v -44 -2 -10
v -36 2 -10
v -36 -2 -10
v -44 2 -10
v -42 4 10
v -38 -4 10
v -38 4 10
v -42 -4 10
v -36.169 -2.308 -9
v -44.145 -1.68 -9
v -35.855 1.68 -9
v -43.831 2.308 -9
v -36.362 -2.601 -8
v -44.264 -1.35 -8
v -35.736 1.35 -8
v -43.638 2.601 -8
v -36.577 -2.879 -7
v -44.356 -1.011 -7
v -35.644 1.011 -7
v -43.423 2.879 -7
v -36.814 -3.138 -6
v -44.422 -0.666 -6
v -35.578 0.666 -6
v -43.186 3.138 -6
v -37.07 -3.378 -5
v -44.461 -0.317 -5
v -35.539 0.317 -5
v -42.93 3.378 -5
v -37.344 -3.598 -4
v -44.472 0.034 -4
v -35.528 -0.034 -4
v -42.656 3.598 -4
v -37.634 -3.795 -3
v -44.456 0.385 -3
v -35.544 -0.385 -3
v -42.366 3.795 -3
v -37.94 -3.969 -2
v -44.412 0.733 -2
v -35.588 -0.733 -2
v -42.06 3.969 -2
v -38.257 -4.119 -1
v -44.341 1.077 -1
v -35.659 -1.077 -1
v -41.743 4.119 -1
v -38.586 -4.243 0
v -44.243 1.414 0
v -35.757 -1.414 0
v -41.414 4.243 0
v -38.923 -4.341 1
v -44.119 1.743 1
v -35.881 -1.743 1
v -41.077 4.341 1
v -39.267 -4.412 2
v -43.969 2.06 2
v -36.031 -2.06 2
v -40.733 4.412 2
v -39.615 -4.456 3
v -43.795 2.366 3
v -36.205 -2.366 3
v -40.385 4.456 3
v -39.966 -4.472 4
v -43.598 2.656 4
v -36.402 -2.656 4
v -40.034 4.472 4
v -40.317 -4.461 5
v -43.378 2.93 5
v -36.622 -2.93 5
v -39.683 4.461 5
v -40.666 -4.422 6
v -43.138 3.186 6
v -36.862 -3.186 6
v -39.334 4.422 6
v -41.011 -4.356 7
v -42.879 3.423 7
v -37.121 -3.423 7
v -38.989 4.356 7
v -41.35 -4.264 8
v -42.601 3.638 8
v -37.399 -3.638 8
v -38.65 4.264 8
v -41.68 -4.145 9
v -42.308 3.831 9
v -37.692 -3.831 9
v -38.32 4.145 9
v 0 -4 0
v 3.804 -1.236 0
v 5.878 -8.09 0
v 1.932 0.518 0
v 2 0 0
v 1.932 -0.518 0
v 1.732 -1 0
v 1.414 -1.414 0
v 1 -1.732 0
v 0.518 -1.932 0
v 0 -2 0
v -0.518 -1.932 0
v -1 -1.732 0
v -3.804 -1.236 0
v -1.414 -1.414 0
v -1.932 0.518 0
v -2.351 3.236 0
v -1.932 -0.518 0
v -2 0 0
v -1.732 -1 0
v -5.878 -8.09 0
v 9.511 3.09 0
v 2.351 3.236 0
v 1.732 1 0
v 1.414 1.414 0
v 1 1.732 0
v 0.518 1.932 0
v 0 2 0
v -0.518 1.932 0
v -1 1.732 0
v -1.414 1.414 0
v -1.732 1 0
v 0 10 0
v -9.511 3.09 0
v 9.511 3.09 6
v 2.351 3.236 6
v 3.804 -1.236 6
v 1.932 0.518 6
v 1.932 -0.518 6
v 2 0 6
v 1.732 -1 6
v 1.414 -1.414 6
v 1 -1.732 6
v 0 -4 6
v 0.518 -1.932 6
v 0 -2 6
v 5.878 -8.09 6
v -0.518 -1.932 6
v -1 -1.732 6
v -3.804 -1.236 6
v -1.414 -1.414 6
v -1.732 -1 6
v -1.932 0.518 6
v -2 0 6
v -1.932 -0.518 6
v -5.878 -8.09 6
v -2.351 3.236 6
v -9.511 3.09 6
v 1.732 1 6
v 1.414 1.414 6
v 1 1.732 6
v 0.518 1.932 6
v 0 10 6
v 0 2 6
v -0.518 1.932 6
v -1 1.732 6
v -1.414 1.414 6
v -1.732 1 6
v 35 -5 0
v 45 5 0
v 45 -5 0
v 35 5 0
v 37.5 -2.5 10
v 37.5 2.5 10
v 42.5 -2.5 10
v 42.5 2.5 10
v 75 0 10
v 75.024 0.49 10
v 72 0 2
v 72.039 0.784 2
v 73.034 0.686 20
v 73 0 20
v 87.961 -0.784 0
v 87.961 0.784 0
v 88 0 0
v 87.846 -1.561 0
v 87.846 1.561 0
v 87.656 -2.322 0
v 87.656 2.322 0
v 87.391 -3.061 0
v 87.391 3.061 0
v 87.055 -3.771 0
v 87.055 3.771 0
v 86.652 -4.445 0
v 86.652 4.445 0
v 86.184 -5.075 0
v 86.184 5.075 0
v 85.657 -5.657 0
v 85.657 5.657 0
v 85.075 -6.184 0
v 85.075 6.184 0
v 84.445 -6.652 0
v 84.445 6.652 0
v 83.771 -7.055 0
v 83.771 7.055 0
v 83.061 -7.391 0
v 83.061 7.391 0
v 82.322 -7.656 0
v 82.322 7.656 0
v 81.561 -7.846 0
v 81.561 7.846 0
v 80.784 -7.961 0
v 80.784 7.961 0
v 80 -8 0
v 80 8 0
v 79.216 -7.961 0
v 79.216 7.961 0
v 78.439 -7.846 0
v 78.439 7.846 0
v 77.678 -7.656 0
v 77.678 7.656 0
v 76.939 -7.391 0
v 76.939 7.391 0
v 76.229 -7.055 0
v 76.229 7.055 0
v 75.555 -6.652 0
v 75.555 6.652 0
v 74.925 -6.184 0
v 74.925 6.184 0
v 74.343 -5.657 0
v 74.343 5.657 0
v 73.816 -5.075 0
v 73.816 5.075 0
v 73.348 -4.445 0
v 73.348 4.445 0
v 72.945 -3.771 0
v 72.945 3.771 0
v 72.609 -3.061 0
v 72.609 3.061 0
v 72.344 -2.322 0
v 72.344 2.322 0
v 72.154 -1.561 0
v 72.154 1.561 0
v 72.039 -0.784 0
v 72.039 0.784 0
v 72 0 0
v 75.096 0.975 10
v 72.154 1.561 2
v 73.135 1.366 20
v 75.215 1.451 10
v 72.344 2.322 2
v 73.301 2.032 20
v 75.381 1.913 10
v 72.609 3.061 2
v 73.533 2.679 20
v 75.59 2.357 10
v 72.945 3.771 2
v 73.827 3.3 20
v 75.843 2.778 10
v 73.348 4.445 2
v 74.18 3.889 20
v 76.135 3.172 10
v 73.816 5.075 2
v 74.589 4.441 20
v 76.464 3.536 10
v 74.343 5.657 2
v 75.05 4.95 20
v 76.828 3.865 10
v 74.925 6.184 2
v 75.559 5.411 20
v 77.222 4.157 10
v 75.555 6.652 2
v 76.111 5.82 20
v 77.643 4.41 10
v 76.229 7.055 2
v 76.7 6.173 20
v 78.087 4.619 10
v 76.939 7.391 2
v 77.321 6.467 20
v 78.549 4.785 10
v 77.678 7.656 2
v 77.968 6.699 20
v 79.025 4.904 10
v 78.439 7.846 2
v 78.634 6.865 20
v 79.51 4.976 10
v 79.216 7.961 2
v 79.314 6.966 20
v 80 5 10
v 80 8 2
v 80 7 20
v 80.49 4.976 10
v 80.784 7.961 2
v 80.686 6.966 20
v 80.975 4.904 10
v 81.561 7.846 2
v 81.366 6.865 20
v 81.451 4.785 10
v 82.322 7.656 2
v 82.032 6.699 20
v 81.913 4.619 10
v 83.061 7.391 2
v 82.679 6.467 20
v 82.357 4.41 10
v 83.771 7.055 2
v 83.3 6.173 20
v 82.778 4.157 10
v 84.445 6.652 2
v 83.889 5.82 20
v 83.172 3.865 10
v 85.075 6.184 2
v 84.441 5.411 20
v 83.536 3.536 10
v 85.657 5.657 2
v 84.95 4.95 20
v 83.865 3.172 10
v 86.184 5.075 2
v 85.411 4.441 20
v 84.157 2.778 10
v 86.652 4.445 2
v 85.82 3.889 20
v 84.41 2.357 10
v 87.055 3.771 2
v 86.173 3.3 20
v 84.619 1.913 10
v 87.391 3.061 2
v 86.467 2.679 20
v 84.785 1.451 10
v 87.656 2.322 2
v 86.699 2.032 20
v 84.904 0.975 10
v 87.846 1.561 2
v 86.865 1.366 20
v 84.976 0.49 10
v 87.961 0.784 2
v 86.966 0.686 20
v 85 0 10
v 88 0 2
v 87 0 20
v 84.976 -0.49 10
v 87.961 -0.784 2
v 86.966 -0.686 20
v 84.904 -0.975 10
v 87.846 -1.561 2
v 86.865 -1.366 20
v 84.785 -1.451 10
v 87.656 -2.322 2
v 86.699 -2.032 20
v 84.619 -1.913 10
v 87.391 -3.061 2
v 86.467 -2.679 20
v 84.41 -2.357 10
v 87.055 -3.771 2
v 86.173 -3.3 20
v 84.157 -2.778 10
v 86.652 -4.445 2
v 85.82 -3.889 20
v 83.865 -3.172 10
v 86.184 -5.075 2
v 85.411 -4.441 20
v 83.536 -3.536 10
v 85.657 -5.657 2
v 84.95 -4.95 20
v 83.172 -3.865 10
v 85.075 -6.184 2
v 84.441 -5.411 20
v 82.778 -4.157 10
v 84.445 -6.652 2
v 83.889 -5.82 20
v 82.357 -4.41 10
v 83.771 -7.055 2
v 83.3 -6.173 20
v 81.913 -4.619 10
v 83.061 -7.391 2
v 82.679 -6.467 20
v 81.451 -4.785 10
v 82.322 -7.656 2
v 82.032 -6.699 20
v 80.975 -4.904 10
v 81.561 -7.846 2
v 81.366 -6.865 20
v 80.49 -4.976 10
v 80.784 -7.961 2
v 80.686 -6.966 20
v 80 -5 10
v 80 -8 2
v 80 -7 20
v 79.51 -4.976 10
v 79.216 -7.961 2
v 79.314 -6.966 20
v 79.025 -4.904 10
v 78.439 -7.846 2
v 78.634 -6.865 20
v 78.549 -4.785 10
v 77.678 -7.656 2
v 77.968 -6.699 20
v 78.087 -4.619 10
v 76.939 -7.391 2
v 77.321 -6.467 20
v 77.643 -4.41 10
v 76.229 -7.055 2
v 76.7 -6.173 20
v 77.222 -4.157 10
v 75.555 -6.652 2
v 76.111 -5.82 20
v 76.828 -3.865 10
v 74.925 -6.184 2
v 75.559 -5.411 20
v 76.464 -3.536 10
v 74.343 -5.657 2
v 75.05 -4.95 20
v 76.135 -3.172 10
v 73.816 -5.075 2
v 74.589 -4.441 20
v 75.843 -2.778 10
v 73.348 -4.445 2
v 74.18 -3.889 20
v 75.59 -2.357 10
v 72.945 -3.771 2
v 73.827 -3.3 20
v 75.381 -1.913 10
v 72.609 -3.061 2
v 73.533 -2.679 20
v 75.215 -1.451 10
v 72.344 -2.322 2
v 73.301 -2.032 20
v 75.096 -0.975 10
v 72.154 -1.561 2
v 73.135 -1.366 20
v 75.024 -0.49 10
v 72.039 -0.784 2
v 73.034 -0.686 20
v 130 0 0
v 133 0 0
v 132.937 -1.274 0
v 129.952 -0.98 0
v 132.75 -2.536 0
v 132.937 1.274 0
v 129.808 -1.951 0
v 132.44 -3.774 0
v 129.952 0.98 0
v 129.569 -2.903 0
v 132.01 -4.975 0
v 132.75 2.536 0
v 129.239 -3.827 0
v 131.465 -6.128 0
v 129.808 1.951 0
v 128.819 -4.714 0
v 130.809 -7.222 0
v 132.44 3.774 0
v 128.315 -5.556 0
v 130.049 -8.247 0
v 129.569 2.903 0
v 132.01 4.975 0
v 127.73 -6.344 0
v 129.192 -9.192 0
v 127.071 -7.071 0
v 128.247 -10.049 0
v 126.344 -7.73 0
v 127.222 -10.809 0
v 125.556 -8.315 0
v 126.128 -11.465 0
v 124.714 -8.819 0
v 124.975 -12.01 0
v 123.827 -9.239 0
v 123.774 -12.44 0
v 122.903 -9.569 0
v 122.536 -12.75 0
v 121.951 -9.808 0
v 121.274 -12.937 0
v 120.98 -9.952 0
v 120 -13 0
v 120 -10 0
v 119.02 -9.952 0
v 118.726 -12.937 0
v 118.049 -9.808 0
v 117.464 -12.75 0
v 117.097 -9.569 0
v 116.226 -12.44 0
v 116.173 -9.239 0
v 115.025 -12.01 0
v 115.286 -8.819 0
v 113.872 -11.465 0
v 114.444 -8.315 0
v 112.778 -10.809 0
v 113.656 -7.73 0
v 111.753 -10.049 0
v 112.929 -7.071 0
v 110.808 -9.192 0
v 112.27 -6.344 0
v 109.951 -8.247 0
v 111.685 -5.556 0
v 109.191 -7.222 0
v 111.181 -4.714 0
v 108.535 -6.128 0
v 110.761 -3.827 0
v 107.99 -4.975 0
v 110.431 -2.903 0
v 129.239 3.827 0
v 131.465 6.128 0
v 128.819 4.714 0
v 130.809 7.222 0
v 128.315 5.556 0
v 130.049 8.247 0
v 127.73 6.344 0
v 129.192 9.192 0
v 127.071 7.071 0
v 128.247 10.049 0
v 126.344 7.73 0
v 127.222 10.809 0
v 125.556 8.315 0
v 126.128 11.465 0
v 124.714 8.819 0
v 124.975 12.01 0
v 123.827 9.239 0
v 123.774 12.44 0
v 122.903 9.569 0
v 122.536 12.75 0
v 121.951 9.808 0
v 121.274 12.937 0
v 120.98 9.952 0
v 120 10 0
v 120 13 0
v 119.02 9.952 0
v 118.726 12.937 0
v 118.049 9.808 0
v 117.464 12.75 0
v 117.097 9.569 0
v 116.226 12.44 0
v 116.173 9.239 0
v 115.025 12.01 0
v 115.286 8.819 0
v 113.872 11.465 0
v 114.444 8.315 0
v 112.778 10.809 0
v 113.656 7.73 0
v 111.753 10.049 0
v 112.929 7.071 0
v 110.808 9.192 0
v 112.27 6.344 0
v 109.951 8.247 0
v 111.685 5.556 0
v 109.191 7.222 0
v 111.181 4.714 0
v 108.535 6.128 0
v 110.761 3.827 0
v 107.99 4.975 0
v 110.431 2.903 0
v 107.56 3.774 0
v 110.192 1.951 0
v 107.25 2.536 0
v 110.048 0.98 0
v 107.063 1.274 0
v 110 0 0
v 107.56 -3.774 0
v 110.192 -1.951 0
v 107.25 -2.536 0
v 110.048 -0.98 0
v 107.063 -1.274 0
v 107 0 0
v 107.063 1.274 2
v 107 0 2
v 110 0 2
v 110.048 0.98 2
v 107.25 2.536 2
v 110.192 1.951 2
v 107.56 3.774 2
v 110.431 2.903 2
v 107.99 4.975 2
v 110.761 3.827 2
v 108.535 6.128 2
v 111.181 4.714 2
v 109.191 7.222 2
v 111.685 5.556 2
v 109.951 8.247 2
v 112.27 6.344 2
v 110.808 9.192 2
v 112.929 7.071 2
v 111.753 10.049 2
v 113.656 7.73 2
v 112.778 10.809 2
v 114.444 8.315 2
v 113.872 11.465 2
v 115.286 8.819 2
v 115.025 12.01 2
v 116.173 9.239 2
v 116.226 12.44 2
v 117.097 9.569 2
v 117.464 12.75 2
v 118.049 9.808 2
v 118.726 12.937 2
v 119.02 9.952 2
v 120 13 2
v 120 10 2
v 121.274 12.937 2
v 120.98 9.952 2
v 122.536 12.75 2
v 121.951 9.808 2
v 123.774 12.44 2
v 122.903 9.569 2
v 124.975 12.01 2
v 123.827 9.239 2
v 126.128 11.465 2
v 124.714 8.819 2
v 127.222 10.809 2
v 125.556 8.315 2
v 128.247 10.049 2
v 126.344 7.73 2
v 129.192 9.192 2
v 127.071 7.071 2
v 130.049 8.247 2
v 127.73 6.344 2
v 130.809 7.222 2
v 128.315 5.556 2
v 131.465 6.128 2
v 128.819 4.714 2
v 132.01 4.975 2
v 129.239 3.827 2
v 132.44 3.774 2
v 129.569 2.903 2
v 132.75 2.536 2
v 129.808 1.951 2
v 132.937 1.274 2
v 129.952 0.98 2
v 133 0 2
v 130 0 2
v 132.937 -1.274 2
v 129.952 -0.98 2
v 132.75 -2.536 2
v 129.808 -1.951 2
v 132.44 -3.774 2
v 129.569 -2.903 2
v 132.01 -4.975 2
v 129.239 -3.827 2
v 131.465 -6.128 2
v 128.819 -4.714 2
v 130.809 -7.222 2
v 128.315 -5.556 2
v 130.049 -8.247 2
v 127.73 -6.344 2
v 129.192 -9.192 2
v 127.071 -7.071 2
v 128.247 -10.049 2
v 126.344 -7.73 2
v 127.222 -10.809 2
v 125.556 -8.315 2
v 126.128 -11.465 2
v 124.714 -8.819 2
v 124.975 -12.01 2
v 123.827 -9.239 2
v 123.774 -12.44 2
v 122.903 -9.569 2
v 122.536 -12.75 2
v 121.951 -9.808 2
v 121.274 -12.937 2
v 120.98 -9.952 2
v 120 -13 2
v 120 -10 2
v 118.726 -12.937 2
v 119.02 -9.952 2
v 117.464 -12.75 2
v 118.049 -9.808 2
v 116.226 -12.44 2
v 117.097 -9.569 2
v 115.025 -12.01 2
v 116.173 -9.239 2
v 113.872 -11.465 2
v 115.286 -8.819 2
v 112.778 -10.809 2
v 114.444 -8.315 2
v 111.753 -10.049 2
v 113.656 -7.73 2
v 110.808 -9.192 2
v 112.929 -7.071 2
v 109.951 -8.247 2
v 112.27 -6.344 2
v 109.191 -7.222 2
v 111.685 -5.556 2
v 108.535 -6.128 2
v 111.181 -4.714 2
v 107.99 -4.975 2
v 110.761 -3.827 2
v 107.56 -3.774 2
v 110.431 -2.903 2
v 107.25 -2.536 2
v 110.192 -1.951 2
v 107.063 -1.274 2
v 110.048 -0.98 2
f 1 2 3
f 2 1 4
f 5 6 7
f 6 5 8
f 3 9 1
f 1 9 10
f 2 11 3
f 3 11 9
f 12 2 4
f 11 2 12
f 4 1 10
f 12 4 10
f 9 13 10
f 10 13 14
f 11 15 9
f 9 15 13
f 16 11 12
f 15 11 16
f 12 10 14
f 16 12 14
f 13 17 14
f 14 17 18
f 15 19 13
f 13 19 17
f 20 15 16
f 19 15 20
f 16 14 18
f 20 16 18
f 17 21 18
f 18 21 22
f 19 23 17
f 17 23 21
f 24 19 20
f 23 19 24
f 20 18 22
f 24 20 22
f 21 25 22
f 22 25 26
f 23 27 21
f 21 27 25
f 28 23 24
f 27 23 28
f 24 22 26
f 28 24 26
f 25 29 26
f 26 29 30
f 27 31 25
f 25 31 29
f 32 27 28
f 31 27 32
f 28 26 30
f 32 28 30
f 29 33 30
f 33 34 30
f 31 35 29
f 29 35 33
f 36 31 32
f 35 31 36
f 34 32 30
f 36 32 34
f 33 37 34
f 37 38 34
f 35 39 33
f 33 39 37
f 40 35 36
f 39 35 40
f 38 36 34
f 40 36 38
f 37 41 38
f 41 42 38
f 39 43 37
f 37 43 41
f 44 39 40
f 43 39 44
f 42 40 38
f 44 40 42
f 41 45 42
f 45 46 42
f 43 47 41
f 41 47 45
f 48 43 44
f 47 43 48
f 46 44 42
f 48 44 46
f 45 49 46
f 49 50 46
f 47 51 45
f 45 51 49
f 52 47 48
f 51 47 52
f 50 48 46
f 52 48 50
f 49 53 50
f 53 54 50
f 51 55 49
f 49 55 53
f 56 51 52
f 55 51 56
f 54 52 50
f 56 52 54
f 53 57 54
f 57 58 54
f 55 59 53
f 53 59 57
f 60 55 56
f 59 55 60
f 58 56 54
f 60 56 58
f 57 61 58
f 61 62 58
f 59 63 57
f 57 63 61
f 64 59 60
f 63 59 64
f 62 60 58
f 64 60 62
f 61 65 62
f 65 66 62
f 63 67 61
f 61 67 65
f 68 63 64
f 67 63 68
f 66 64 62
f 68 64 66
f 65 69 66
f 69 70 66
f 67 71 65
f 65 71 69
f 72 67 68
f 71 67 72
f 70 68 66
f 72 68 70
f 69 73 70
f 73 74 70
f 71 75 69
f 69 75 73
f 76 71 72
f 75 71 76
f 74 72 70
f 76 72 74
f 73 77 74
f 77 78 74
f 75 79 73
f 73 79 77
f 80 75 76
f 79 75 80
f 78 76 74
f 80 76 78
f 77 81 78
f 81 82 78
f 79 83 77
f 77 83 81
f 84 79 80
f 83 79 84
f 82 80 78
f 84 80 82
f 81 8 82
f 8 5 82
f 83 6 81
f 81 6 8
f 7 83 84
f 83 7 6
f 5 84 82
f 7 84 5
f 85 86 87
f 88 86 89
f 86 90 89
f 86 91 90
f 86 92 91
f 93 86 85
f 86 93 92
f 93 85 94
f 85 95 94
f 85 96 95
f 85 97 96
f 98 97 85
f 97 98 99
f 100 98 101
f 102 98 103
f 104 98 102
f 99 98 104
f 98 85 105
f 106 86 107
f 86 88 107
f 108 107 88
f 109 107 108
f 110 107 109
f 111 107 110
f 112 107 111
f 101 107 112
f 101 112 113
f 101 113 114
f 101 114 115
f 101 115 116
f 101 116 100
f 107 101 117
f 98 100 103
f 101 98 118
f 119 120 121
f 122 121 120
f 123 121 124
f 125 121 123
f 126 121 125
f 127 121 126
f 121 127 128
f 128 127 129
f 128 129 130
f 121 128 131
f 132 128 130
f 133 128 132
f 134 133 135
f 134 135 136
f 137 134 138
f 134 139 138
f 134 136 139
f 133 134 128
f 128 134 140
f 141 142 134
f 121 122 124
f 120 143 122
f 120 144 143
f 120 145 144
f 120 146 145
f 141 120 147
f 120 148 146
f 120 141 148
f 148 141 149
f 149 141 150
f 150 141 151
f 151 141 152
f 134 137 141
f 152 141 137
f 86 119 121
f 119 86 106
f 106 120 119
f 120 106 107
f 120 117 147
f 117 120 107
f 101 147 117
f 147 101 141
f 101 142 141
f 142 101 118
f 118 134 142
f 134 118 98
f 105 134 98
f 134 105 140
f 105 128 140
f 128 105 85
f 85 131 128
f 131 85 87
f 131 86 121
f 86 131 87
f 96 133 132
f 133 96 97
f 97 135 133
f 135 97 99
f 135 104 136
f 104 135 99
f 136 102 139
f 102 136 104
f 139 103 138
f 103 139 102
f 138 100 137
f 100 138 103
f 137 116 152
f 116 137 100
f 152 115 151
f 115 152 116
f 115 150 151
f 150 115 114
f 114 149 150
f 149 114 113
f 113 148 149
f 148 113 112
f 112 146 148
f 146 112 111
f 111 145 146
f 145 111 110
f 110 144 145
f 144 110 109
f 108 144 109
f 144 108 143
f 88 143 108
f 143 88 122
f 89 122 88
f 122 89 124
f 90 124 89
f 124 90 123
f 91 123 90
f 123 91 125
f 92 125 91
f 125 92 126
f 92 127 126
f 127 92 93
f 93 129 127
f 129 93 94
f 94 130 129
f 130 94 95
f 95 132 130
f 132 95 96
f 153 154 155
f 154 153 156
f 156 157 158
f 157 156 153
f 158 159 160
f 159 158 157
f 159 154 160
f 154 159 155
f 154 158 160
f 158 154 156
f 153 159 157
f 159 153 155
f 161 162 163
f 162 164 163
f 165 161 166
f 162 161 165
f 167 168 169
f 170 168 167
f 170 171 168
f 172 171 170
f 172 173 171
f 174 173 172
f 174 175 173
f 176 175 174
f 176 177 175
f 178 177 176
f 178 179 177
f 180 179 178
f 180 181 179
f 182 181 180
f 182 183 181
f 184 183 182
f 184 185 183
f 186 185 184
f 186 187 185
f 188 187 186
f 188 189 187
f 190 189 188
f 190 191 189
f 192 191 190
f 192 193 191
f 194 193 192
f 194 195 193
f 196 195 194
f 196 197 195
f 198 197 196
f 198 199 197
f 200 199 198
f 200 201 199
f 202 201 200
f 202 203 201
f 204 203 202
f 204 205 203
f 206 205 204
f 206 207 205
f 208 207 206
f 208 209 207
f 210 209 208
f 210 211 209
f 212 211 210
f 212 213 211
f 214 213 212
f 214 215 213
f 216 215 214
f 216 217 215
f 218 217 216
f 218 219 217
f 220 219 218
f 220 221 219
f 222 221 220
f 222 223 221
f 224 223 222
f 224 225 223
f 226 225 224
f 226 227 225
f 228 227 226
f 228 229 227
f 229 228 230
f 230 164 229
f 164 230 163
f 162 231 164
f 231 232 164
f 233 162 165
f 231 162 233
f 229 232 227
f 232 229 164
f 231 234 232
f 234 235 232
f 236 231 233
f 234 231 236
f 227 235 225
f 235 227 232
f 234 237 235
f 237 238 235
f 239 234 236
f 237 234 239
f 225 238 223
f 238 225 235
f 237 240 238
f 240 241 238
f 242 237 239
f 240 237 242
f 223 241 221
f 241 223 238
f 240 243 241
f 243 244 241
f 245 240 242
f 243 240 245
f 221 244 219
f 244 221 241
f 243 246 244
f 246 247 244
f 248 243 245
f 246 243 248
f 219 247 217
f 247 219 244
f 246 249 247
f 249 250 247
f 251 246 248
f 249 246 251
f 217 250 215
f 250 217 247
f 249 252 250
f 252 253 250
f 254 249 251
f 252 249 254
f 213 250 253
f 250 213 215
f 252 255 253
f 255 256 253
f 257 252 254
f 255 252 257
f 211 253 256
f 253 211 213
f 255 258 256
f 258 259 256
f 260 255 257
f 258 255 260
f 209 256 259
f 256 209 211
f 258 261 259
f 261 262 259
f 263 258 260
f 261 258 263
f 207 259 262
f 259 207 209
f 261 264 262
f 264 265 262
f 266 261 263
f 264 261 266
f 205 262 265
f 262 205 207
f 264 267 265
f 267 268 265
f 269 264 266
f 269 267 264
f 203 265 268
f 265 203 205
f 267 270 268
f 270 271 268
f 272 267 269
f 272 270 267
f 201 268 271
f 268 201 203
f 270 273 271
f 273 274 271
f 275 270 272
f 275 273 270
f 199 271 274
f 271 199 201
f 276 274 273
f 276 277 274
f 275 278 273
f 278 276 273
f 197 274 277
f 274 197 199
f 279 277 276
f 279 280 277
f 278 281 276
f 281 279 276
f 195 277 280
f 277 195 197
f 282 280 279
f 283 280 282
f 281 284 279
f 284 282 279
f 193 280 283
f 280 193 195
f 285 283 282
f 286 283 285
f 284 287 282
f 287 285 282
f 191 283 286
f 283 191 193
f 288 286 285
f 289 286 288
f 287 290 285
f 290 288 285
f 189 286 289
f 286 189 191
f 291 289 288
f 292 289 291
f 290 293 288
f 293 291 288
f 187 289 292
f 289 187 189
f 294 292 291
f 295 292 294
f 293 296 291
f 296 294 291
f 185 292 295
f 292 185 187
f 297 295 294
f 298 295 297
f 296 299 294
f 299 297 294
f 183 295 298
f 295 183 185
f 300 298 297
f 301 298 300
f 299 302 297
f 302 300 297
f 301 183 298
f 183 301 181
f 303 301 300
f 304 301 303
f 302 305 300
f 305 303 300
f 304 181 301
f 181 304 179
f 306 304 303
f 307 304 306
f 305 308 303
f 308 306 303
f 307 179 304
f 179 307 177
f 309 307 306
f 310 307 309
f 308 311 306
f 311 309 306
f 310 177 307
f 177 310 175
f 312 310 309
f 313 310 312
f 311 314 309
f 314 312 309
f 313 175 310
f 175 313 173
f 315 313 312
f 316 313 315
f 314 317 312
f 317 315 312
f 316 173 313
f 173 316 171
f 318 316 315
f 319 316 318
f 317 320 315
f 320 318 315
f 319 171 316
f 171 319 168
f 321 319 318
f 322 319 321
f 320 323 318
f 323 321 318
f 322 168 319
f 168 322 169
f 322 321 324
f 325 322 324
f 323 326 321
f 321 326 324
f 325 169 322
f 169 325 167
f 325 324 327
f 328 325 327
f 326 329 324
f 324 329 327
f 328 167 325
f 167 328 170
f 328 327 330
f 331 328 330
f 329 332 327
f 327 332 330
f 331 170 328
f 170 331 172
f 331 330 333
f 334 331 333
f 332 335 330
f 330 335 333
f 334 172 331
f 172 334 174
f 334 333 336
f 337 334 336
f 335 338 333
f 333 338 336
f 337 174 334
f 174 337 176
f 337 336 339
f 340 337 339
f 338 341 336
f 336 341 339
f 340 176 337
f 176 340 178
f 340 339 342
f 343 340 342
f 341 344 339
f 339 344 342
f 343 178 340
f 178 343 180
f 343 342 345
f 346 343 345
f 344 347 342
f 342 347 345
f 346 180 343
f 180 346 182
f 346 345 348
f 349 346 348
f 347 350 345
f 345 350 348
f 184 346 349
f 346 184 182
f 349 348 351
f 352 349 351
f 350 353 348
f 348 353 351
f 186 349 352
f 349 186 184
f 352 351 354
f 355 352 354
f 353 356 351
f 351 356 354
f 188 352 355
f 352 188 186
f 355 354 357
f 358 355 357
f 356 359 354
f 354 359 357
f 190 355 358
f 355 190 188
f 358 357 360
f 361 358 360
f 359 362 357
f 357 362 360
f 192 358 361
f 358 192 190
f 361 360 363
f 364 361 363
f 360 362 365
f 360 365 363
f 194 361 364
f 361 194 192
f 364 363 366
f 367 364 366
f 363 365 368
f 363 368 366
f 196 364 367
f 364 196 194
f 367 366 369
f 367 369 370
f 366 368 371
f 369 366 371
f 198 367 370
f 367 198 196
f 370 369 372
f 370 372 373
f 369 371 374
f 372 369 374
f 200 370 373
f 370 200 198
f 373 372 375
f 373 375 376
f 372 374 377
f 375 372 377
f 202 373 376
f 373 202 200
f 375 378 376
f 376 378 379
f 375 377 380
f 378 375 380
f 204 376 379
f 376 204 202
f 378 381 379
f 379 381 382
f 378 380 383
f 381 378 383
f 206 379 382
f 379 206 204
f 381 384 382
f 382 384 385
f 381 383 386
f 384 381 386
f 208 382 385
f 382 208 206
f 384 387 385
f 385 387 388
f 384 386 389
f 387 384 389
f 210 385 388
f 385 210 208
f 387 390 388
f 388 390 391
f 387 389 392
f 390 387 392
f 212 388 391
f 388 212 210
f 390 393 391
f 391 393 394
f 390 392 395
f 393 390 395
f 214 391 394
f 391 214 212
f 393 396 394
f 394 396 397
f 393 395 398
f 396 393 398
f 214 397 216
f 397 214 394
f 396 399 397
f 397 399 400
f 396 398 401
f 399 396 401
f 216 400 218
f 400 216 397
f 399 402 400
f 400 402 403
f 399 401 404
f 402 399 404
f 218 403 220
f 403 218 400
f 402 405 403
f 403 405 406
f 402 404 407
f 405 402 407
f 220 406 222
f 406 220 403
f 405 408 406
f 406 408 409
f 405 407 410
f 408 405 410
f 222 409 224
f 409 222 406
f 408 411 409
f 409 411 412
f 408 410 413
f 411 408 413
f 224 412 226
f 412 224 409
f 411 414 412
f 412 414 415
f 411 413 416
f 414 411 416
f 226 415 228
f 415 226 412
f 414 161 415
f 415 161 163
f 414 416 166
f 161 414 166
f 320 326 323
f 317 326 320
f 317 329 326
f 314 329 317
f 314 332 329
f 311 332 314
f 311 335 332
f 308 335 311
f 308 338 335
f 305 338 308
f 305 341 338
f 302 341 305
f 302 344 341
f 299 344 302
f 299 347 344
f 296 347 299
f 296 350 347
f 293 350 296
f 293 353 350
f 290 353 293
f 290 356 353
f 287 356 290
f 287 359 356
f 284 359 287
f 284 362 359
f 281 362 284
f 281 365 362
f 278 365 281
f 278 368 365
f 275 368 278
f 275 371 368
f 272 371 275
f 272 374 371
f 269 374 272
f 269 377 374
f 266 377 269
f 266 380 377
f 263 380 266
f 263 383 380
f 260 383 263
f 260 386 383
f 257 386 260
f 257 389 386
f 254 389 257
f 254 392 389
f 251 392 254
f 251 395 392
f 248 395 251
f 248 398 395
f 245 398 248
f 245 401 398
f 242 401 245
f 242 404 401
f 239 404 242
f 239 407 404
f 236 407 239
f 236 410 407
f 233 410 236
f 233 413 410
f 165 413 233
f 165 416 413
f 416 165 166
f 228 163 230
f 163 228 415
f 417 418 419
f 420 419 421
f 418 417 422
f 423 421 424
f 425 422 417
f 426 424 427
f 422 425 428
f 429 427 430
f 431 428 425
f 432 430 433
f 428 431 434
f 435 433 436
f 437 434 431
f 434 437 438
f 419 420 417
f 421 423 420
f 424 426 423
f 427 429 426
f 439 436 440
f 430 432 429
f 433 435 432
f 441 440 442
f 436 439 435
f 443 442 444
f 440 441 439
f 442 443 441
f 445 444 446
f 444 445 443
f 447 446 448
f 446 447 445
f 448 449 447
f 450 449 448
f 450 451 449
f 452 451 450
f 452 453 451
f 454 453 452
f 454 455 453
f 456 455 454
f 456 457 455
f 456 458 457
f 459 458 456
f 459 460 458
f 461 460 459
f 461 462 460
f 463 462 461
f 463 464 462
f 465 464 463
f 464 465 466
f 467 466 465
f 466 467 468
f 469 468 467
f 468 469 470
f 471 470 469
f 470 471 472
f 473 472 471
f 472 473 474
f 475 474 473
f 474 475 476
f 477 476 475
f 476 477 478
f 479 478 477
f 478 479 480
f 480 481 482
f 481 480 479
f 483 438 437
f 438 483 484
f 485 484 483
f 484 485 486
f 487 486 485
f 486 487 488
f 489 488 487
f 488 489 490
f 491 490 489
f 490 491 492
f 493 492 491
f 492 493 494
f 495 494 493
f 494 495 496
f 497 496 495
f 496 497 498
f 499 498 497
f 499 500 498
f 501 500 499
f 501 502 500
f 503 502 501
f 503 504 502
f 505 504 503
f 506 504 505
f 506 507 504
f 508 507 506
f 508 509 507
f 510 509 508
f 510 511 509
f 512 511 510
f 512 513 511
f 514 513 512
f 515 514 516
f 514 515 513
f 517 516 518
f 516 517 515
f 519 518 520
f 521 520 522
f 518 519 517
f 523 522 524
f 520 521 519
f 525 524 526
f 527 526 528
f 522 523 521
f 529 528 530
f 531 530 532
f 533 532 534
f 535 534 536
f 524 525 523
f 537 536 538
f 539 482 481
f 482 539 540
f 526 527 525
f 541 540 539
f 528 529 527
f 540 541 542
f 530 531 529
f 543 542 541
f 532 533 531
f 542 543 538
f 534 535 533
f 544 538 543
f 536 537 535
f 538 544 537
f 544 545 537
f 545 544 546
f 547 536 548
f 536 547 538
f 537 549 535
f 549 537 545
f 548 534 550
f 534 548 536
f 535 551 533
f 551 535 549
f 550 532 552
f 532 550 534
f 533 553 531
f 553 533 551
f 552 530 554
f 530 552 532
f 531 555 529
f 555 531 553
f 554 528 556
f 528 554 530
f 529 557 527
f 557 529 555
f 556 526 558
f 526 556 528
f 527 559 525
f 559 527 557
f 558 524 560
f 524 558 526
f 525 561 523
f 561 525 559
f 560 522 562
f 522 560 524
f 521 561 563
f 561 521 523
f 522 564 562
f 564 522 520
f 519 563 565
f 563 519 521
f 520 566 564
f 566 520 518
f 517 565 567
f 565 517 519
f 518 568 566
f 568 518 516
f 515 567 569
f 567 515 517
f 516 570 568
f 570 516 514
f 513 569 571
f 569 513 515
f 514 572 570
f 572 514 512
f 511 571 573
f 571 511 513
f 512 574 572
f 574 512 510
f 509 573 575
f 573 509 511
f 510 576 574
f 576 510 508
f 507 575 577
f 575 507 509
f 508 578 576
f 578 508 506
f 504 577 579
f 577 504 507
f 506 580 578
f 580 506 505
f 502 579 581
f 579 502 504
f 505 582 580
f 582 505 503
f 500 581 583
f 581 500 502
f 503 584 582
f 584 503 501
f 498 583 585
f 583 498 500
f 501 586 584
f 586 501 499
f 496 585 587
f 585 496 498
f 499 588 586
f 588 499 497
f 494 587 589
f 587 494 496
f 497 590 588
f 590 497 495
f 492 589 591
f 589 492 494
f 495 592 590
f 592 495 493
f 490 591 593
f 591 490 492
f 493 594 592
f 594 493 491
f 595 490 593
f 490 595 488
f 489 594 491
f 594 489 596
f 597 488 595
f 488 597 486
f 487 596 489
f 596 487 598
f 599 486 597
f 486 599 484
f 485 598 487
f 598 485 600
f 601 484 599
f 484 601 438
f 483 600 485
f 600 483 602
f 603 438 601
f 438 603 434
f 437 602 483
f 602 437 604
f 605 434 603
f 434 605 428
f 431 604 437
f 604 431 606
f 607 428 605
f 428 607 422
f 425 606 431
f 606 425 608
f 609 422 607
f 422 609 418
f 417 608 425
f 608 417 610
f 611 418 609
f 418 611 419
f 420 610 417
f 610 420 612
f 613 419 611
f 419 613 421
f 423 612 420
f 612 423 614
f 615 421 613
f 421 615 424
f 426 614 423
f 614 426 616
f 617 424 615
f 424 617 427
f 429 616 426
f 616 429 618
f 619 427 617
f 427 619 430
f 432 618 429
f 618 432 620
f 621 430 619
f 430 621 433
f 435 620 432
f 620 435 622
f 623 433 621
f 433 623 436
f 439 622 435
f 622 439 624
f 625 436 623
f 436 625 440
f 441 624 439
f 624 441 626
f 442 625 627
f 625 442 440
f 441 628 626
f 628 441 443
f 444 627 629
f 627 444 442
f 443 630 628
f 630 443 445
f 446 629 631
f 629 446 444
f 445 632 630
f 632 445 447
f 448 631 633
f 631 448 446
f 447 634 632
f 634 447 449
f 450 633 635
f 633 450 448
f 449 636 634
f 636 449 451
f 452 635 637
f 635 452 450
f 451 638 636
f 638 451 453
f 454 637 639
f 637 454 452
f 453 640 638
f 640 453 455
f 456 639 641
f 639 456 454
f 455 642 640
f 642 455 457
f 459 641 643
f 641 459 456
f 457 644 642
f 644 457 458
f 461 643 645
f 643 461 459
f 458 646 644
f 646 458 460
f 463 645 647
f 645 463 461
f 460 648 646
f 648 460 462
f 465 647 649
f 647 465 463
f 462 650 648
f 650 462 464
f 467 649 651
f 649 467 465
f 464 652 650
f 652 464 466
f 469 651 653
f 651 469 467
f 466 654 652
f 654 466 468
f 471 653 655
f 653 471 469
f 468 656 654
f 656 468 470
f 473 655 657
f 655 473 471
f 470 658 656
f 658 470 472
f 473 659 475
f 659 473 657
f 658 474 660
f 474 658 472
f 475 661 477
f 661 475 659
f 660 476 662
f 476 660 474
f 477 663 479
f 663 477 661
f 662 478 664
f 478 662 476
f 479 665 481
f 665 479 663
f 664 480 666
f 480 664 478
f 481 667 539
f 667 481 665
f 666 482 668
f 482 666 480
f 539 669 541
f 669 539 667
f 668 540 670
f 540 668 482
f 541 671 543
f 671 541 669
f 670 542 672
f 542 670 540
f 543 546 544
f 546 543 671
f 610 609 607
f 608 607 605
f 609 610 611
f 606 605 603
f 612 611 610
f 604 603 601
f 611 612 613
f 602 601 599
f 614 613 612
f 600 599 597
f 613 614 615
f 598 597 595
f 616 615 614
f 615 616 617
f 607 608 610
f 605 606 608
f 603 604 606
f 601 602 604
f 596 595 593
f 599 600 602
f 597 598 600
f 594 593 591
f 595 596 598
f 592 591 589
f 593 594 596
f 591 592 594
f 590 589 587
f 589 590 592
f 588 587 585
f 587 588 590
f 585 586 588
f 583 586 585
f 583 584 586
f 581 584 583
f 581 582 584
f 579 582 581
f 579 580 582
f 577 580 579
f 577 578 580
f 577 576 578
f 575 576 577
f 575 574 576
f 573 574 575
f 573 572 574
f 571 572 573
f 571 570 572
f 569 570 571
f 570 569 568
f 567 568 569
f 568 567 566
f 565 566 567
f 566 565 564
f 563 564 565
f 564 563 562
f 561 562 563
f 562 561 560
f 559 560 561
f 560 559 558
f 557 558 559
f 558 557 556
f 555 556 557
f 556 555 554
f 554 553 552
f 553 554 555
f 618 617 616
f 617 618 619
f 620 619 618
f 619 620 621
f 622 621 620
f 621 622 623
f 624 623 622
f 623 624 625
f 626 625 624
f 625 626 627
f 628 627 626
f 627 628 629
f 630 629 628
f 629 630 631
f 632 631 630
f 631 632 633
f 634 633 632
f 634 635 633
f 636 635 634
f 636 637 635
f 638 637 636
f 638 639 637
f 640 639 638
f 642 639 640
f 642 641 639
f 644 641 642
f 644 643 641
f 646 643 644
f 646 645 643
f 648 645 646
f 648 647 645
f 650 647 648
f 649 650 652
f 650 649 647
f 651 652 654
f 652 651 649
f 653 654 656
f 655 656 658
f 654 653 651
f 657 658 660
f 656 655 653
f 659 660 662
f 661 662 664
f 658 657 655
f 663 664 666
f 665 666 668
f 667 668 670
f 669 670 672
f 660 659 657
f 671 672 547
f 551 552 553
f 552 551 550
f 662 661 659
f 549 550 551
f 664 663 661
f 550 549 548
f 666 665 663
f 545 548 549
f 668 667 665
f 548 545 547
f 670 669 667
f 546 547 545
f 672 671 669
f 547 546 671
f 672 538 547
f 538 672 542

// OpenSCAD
// Original CanvasNet test fixture: five extruded shapes in a row along X, centered at x = -40, 0, 40, 80 and 120.
$fn = 64;

// A twisted bar centered on its own middle: footprint 8 x 4, 20 tall (z -10..10), a quarter turn over the height
translate([-40, 0, 0])
  linear_extrude(height = 20, twist = 90, slices = 20, center = true) square([8, 4], center = true);

// A five-pointed star (tip radius 10, notch radius 4) with a round hole in the middle, 6 tall
star_points = [for (i = [0 : 9])
  let(r = i % 2 == 0 ? 10 : 4, a = 90 + i * 36) [r * cos(a), r * sin(a)]];
linear_extrude(height = 6)
  difference() {
    polygon(star_points);
    circle(r = 2, $fn = 24);
  }

// A square frustum: 10 x 10 at the bottom, 5 x 5 at the top, 10 tall
translate([40, 0, 0]) linear_extrude(height = 10, scale = 0.5) square(10, center = true);

// A vase turned from a profile: radius 8 at the foot, 5 at the waist (z = 10), 7 at the rim (z = 20)
translate([80, 0, 0]) rotate_extrude() polygon([[0, 0], [8, 0], [8, 2], [5, 10], [7, 20], [0, 20]]);

// A flat ring: inner radius 10, outer radius 13, 2 tall
translate([120, 0, 0]) rotate_extrude() translate([10, 0]) square([3, 2]);
